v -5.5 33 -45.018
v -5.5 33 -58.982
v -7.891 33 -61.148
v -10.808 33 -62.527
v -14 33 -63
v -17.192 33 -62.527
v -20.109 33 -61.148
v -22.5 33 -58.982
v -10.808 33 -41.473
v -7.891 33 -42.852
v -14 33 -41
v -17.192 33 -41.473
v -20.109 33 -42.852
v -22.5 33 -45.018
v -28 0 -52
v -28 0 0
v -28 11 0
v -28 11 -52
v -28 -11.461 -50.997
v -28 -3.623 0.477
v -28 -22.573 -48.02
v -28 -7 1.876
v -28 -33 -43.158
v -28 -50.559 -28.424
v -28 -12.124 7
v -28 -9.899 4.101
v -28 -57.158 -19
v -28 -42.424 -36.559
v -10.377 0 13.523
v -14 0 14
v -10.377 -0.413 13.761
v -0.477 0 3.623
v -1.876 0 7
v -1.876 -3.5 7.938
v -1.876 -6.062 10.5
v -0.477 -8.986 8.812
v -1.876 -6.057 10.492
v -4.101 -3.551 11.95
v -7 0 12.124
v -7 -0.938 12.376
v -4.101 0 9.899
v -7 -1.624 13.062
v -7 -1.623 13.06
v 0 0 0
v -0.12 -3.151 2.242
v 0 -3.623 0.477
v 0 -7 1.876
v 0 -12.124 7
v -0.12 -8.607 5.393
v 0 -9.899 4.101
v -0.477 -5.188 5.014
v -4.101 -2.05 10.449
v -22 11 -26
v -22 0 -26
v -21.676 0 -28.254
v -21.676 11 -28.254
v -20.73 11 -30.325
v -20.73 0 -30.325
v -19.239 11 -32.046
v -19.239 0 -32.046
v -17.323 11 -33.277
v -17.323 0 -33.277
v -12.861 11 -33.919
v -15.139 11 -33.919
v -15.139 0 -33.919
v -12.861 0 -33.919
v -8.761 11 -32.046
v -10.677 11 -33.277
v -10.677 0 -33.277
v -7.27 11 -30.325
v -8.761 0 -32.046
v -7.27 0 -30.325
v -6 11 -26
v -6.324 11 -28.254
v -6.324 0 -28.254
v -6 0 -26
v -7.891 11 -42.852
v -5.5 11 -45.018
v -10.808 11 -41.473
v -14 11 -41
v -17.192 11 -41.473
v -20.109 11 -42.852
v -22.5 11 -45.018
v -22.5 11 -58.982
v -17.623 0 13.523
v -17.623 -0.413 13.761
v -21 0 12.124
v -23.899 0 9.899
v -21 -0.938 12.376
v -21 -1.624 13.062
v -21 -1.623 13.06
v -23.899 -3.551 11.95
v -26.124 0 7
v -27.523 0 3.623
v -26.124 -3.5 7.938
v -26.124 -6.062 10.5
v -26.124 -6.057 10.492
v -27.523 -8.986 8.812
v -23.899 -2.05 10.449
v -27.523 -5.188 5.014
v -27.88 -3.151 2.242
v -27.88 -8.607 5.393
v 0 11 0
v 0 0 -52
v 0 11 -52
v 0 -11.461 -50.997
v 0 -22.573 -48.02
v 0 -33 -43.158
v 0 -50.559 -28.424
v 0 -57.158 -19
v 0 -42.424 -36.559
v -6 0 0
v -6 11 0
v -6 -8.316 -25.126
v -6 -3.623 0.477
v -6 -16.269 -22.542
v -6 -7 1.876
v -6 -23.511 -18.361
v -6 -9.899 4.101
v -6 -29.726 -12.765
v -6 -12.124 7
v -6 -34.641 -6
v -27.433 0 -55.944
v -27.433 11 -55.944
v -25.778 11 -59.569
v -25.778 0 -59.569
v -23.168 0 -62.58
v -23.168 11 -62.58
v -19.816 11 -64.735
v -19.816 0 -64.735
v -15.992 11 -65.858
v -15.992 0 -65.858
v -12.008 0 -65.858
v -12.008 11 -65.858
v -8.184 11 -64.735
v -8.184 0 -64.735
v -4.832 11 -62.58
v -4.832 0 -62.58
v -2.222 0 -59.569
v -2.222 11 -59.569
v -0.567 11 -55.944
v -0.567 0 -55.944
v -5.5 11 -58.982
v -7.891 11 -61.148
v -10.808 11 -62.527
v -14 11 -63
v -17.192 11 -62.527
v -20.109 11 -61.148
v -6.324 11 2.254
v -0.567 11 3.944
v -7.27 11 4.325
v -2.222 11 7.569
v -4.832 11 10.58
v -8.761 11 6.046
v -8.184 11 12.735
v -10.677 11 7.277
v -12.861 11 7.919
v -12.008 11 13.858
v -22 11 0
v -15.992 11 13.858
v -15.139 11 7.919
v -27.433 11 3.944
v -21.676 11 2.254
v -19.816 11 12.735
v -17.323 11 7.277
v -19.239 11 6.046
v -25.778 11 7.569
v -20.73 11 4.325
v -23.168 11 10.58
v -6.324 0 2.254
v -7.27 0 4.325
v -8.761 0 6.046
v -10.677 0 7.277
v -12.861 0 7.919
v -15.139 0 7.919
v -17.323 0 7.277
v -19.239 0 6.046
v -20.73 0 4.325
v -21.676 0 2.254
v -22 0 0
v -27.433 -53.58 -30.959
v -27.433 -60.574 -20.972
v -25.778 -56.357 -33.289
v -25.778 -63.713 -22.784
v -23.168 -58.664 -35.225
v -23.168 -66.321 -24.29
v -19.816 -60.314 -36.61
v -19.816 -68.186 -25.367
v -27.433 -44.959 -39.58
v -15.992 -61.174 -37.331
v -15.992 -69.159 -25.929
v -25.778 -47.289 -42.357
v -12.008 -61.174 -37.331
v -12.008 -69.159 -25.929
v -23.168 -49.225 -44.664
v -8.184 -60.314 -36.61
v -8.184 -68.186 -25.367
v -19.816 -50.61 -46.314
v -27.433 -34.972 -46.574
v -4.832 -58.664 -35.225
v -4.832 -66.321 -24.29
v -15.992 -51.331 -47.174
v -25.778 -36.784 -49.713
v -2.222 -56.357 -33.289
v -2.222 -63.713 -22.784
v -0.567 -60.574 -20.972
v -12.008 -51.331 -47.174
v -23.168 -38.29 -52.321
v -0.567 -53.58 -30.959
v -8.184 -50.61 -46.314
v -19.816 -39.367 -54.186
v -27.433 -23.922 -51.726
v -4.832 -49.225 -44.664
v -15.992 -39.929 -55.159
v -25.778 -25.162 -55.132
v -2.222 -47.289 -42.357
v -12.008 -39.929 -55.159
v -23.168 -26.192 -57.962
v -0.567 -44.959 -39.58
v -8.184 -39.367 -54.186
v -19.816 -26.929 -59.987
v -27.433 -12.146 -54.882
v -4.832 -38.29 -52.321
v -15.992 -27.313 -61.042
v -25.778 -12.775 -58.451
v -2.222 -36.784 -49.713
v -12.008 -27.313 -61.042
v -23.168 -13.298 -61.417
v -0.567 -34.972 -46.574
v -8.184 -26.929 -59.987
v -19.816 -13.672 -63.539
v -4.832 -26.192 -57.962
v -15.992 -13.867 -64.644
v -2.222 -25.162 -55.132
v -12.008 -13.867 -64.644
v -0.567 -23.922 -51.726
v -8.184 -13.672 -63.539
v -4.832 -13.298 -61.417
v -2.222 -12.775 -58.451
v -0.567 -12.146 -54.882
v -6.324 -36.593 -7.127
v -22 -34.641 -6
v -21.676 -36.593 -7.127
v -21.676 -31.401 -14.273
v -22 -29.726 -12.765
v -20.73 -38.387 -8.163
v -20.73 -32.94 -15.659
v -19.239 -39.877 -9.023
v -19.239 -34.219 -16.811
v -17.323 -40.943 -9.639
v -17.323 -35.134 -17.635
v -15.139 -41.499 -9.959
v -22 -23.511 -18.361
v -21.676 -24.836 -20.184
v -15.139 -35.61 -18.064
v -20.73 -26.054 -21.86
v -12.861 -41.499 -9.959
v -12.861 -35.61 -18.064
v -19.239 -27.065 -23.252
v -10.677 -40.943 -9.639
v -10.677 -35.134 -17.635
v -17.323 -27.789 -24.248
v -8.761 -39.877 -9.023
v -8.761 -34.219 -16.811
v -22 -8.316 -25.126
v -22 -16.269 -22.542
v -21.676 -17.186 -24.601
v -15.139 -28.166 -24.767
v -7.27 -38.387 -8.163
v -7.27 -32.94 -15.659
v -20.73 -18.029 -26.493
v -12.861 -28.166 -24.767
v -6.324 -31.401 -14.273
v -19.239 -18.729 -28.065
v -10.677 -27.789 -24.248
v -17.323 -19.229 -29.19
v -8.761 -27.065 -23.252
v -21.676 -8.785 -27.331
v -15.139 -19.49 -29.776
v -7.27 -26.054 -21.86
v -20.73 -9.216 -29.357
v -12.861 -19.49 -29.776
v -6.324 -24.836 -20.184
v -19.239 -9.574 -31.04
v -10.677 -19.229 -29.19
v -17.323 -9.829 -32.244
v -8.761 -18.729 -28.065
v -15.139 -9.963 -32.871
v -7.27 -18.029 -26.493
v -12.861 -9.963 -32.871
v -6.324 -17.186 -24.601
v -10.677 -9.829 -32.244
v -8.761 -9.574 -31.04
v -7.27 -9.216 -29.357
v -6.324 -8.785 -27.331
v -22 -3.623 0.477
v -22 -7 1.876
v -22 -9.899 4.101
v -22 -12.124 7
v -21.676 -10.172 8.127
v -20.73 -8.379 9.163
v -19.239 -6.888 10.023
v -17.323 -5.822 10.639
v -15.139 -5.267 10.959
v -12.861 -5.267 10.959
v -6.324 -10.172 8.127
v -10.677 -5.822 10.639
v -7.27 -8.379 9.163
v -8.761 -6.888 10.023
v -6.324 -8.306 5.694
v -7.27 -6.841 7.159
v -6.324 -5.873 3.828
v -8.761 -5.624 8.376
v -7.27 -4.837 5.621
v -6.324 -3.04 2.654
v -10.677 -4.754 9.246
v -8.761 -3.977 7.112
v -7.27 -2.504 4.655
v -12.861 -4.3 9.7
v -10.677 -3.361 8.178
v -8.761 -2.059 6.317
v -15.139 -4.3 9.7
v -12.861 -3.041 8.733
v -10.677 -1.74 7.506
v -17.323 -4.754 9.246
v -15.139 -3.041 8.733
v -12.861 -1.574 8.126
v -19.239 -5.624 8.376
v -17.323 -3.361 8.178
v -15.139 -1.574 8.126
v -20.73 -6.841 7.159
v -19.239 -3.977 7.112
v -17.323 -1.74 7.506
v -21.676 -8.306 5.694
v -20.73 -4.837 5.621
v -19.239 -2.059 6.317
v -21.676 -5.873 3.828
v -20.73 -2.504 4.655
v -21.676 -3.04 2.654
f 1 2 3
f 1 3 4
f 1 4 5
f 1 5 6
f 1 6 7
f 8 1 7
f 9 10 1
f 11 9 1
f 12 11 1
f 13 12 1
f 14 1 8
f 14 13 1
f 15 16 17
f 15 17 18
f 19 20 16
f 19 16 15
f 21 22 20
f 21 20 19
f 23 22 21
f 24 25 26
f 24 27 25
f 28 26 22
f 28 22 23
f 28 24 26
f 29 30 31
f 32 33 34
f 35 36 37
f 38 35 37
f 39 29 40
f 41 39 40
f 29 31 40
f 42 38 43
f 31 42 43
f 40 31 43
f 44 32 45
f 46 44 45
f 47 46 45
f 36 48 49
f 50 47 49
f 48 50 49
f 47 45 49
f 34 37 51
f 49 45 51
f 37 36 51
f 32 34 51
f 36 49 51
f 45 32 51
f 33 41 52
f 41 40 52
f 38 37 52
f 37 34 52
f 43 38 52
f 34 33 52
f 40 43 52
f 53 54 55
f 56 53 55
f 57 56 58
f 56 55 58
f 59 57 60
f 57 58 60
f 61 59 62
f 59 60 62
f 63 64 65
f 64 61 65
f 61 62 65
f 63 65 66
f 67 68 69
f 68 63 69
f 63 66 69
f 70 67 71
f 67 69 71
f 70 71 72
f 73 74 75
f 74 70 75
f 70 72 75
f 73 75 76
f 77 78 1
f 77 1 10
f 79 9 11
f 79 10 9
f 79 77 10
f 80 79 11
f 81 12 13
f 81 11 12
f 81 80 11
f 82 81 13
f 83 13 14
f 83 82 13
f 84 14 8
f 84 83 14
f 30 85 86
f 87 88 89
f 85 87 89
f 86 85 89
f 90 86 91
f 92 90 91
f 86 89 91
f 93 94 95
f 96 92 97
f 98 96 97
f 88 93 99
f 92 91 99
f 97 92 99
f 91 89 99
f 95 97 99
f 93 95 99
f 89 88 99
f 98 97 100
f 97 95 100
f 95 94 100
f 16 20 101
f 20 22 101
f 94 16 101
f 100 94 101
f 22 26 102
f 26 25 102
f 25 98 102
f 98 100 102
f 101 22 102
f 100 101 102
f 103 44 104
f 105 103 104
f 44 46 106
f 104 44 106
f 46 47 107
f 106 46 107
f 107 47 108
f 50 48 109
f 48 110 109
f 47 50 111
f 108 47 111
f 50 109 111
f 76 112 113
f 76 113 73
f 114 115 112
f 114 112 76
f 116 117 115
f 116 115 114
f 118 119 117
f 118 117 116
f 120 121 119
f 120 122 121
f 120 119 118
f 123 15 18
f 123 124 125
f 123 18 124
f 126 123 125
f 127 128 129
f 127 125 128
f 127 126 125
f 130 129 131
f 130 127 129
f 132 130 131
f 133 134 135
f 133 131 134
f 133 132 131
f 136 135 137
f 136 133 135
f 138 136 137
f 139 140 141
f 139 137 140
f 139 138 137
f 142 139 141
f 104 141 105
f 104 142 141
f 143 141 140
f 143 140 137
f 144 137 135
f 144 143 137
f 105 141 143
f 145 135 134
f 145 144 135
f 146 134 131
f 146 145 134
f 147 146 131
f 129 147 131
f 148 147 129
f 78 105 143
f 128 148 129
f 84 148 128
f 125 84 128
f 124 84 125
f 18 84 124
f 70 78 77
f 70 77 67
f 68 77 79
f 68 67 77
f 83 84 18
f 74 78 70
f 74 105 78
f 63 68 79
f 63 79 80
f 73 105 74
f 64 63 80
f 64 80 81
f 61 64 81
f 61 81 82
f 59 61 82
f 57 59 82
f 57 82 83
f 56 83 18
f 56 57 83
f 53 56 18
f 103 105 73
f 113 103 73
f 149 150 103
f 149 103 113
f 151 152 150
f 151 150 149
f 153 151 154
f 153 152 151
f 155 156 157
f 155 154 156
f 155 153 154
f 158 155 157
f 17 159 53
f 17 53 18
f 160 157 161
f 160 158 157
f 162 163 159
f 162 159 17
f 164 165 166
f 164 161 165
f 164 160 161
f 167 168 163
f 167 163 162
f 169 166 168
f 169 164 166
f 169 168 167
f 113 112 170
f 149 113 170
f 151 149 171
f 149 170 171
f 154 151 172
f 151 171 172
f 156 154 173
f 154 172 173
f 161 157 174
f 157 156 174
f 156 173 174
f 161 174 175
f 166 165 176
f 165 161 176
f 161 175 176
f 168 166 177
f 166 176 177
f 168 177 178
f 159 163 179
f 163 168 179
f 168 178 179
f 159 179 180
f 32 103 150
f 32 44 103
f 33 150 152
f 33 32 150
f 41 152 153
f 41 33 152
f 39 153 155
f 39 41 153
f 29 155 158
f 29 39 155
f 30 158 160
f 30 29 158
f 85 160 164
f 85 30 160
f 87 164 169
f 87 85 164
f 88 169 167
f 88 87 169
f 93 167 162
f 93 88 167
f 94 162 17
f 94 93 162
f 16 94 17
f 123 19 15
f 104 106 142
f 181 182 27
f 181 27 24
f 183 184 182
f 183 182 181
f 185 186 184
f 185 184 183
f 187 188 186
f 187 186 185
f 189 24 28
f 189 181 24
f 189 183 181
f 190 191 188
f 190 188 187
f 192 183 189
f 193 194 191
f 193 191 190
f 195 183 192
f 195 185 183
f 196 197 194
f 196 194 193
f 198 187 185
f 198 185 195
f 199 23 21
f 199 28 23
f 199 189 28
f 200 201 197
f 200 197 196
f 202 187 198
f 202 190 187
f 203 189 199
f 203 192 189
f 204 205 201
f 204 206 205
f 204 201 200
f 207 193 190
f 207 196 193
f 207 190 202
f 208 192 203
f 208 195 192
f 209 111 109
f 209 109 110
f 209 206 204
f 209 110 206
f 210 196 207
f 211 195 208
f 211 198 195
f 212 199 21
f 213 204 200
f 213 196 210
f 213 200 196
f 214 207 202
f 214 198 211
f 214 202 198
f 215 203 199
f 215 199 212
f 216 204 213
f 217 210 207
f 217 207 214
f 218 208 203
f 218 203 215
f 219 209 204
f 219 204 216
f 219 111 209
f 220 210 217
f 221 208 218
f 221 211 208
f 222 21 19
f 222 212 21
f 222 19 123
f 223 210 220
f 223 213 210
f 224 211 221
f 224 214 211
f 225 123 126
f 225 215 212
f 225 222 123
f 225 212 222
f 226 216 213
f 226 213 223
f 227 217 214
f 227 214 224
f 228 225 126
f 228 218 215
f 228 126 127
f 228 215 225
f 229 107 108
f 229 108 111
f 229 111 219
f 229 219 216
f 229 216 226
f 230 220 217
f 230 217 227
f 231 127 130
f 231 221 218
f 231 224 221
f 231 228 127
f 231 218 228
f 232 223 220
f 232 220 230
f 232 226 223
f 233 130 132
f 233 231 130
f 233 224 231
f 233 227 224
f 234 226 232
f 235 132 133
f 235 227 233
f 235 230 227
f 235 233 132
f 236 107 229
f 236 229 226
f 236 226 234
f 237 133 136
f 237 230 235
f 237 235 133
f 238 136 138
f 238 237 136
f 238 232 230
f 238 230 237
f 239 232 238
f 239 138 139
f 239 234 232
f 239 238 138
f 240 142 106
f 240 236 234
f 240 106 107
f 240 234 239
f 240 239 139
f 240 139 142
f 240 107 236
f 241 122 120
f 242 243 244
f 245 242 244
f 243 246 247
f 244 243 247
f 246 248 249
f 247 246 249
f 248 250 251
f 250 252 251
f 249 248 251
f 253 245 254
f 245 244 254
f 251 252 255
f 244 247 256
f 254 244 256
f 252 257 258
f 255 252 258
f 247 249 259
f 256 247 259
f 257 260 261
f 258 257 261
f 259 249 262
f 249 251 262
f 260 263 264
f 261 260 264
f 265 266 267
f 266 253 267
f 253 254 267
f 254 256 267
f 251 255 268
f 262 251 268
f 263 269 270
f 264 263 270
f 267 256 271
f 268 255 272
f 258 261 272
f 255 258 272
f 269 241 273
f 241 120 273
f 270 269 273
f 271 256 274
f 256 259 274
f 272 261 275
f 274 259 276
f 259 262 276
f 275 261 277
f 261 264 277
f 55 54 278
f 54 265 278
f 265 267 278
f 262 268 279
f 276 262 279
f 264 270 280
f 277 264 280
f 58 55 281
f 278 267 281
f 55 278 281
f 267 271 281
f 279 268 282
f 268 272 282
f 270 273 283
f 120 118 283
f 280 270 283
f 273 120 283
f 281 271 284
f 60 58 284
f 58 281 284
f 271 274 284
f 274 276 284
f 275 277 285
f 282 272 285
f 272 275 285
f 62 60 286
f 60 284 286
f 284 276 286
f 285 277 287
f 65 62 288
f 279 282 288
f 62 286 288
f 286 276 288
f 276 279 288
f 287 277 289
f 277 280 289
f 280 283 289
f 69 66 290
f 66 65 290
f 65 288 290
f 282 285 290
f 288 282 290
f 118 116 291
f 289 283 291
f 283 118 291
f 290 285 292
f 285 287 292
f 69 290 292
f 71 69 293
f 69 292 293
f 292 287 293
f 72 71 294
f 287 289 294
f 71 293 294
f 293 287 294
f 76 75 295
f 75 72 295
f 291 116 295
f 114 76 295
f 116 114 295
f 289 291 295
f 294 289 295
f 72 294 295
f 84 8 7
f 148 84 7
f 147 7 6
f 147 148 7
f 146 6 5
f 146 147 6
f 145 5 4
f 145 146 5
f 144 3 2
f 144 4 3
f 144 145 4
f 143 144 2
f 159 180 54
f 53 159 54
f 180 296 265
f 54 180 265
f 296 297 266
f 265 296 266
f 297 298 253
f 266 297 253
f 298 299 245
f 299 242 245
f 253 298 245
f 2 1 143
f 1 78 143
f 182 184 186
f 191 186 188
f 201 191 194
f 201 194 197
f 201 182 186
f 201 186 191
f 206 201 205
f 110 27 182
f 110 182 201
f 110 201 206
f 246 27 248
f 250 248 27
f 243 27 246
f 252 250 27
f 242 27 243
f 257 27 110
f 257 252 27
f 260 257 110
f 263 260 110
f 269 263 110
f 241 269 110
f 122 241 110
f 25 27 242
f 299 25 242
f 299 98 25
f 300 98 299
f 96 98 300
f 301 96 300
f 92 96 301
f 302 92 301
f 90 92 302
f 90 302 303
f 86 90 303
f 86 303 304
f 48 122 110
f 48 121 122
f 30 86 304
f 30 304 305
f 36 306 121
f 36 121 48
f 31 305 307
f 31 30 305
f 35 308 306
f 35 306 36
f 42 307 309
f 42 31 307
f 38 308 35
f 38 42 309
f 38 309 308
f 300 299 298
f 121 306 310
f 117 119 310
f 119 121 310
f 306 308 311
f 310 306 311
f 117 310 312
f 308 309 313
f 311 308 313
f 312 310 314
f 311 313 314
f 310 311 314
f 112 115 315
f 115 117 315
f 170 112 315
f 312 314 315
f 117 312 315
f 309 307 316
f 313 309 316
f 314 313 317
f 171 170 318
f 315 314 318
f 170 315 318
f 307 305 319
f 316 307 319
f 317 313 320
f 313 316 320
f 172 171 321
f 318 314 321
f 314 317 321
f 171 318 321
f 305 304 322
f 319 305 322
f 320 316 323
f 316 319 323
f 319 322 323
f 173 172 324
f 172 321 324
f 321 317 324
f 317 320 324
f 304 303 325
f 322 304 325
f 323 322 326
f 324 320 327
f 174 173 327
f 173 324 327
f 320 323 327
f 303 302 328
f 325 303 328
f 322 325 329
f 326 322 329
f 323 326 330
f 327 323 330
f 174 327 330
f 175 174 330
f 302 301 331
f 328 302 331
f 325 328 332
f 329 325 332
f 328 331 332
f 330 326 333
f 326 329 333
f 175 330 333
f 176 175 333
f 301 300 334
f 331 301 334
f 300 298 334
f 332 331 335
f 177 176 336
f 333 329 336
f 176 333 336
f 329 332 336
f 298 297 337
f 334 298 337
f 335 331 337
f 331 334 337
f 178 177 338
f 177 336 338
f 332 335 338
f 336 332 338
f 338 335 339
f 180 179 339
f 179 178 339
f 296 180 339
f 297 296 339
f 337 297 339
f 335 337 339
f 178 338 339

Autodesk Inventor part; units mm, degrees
ref_plane "YZ Plane" through (0, 0, 0) normal (1, 0, 0) x (0, 1, 0)
ref_plane "XZ Plane" through (0, 0, 0) normal (0, 1, 0) x (-1, 0, 0)
ref_plane "XY Plane" through (0, 0, 0) normal (0, 0, 1) x (1, 0, 0)
sketch "Schizzo1" plane through (0, 0, 0) normal (0, 1, 0) x (-1, 0, 0)
  line L0 (0, 0) -> (0, -52)
  arc A0 (0, -52) -> (28, -52) centre (14, -52) ccw
  line L1 (28, -52) -> (28, 0)
  arc A1 (28, 0) -> (0, 0) centre (14, 0) ccw
  line L2 (22, 0) -> (22, -26)
  arc A2 (22, 0) -> (6, 0) centre (14, 0) ccw
  line L3 (6, 0) -> (6, -26)
  arc A3 (6, -26) -> (22, -26) centre (14, -26) ccw
  circle A4 centre (14, -52) radius 11
  line L4 (22.5, -45.0179) -> (22.5, -58.9821)
  line L5 (5.5, -45.0179) -> (5.5, -58.9821)
  dimension "d0" = 22
  dimension "d3" = 8.5
  dimension "d4" = 8.5
  dimension "d5" = 28
  dimension "d6" = 16
  dimension "d7" = 26
  dimension "d8" = 52
extrude "Estrusione1" add sketch "Schizzo1" along normal blind 33 contours L4 A4 L5
extrude "Estrusione2" add sketch "Schizzo1" along normal blind 11 contours A1 L1 A0 L0 | A4 L4 | L5 A4
sketch "Schizzo4" plane through (0, 0, 0) normal (0, -1, 0) x (1, 0, 0)
  arc A0 (0, 0) -> (-28, 0) centre (-14, 0) ccw projected
  line L0 (-28, 0) -> (-28, -51.655)
  arc A1 (-28, -52) -> (0, -52) centre (-14, -52) ccw projected
  line L1 (-28, -51.655) -> (-28, -52)
  arc A2 (-28, -52) -> (0, -52) centre (-14, -52) ccw
  line L2 (0, 0) -> (0, -52) projected
  line L3 (0, -52) -> (0, 0)
  arc A3 (0, 0) -> (-28, 0) centre (-14, 0) ccw
  line L4 (0, 14) -> (-28, 14)
  arc A4 (-22, -26) -> (-6, -26) centre (-14, -26) ccw projected
  line L5 (-22, -26) -> (-22, 0)
  arc A5 (-22, -26) -> (-6, -26) centre (-14, -26) ccw
  line L6 (-6, -26) -> (-6, 0) projected
  line L7 (-6, -26) -> (-6, 0)
  arc A6 (-6, 0) -> (-22, 0) centre (-14, 0) ccw
revolve "Rivoluzione1" add sketch "Schizzo4" angle 60 about axis through (0, 0, 14) along (-1, 0, 0)
properties part number "esercizio2 02-27-2023"
